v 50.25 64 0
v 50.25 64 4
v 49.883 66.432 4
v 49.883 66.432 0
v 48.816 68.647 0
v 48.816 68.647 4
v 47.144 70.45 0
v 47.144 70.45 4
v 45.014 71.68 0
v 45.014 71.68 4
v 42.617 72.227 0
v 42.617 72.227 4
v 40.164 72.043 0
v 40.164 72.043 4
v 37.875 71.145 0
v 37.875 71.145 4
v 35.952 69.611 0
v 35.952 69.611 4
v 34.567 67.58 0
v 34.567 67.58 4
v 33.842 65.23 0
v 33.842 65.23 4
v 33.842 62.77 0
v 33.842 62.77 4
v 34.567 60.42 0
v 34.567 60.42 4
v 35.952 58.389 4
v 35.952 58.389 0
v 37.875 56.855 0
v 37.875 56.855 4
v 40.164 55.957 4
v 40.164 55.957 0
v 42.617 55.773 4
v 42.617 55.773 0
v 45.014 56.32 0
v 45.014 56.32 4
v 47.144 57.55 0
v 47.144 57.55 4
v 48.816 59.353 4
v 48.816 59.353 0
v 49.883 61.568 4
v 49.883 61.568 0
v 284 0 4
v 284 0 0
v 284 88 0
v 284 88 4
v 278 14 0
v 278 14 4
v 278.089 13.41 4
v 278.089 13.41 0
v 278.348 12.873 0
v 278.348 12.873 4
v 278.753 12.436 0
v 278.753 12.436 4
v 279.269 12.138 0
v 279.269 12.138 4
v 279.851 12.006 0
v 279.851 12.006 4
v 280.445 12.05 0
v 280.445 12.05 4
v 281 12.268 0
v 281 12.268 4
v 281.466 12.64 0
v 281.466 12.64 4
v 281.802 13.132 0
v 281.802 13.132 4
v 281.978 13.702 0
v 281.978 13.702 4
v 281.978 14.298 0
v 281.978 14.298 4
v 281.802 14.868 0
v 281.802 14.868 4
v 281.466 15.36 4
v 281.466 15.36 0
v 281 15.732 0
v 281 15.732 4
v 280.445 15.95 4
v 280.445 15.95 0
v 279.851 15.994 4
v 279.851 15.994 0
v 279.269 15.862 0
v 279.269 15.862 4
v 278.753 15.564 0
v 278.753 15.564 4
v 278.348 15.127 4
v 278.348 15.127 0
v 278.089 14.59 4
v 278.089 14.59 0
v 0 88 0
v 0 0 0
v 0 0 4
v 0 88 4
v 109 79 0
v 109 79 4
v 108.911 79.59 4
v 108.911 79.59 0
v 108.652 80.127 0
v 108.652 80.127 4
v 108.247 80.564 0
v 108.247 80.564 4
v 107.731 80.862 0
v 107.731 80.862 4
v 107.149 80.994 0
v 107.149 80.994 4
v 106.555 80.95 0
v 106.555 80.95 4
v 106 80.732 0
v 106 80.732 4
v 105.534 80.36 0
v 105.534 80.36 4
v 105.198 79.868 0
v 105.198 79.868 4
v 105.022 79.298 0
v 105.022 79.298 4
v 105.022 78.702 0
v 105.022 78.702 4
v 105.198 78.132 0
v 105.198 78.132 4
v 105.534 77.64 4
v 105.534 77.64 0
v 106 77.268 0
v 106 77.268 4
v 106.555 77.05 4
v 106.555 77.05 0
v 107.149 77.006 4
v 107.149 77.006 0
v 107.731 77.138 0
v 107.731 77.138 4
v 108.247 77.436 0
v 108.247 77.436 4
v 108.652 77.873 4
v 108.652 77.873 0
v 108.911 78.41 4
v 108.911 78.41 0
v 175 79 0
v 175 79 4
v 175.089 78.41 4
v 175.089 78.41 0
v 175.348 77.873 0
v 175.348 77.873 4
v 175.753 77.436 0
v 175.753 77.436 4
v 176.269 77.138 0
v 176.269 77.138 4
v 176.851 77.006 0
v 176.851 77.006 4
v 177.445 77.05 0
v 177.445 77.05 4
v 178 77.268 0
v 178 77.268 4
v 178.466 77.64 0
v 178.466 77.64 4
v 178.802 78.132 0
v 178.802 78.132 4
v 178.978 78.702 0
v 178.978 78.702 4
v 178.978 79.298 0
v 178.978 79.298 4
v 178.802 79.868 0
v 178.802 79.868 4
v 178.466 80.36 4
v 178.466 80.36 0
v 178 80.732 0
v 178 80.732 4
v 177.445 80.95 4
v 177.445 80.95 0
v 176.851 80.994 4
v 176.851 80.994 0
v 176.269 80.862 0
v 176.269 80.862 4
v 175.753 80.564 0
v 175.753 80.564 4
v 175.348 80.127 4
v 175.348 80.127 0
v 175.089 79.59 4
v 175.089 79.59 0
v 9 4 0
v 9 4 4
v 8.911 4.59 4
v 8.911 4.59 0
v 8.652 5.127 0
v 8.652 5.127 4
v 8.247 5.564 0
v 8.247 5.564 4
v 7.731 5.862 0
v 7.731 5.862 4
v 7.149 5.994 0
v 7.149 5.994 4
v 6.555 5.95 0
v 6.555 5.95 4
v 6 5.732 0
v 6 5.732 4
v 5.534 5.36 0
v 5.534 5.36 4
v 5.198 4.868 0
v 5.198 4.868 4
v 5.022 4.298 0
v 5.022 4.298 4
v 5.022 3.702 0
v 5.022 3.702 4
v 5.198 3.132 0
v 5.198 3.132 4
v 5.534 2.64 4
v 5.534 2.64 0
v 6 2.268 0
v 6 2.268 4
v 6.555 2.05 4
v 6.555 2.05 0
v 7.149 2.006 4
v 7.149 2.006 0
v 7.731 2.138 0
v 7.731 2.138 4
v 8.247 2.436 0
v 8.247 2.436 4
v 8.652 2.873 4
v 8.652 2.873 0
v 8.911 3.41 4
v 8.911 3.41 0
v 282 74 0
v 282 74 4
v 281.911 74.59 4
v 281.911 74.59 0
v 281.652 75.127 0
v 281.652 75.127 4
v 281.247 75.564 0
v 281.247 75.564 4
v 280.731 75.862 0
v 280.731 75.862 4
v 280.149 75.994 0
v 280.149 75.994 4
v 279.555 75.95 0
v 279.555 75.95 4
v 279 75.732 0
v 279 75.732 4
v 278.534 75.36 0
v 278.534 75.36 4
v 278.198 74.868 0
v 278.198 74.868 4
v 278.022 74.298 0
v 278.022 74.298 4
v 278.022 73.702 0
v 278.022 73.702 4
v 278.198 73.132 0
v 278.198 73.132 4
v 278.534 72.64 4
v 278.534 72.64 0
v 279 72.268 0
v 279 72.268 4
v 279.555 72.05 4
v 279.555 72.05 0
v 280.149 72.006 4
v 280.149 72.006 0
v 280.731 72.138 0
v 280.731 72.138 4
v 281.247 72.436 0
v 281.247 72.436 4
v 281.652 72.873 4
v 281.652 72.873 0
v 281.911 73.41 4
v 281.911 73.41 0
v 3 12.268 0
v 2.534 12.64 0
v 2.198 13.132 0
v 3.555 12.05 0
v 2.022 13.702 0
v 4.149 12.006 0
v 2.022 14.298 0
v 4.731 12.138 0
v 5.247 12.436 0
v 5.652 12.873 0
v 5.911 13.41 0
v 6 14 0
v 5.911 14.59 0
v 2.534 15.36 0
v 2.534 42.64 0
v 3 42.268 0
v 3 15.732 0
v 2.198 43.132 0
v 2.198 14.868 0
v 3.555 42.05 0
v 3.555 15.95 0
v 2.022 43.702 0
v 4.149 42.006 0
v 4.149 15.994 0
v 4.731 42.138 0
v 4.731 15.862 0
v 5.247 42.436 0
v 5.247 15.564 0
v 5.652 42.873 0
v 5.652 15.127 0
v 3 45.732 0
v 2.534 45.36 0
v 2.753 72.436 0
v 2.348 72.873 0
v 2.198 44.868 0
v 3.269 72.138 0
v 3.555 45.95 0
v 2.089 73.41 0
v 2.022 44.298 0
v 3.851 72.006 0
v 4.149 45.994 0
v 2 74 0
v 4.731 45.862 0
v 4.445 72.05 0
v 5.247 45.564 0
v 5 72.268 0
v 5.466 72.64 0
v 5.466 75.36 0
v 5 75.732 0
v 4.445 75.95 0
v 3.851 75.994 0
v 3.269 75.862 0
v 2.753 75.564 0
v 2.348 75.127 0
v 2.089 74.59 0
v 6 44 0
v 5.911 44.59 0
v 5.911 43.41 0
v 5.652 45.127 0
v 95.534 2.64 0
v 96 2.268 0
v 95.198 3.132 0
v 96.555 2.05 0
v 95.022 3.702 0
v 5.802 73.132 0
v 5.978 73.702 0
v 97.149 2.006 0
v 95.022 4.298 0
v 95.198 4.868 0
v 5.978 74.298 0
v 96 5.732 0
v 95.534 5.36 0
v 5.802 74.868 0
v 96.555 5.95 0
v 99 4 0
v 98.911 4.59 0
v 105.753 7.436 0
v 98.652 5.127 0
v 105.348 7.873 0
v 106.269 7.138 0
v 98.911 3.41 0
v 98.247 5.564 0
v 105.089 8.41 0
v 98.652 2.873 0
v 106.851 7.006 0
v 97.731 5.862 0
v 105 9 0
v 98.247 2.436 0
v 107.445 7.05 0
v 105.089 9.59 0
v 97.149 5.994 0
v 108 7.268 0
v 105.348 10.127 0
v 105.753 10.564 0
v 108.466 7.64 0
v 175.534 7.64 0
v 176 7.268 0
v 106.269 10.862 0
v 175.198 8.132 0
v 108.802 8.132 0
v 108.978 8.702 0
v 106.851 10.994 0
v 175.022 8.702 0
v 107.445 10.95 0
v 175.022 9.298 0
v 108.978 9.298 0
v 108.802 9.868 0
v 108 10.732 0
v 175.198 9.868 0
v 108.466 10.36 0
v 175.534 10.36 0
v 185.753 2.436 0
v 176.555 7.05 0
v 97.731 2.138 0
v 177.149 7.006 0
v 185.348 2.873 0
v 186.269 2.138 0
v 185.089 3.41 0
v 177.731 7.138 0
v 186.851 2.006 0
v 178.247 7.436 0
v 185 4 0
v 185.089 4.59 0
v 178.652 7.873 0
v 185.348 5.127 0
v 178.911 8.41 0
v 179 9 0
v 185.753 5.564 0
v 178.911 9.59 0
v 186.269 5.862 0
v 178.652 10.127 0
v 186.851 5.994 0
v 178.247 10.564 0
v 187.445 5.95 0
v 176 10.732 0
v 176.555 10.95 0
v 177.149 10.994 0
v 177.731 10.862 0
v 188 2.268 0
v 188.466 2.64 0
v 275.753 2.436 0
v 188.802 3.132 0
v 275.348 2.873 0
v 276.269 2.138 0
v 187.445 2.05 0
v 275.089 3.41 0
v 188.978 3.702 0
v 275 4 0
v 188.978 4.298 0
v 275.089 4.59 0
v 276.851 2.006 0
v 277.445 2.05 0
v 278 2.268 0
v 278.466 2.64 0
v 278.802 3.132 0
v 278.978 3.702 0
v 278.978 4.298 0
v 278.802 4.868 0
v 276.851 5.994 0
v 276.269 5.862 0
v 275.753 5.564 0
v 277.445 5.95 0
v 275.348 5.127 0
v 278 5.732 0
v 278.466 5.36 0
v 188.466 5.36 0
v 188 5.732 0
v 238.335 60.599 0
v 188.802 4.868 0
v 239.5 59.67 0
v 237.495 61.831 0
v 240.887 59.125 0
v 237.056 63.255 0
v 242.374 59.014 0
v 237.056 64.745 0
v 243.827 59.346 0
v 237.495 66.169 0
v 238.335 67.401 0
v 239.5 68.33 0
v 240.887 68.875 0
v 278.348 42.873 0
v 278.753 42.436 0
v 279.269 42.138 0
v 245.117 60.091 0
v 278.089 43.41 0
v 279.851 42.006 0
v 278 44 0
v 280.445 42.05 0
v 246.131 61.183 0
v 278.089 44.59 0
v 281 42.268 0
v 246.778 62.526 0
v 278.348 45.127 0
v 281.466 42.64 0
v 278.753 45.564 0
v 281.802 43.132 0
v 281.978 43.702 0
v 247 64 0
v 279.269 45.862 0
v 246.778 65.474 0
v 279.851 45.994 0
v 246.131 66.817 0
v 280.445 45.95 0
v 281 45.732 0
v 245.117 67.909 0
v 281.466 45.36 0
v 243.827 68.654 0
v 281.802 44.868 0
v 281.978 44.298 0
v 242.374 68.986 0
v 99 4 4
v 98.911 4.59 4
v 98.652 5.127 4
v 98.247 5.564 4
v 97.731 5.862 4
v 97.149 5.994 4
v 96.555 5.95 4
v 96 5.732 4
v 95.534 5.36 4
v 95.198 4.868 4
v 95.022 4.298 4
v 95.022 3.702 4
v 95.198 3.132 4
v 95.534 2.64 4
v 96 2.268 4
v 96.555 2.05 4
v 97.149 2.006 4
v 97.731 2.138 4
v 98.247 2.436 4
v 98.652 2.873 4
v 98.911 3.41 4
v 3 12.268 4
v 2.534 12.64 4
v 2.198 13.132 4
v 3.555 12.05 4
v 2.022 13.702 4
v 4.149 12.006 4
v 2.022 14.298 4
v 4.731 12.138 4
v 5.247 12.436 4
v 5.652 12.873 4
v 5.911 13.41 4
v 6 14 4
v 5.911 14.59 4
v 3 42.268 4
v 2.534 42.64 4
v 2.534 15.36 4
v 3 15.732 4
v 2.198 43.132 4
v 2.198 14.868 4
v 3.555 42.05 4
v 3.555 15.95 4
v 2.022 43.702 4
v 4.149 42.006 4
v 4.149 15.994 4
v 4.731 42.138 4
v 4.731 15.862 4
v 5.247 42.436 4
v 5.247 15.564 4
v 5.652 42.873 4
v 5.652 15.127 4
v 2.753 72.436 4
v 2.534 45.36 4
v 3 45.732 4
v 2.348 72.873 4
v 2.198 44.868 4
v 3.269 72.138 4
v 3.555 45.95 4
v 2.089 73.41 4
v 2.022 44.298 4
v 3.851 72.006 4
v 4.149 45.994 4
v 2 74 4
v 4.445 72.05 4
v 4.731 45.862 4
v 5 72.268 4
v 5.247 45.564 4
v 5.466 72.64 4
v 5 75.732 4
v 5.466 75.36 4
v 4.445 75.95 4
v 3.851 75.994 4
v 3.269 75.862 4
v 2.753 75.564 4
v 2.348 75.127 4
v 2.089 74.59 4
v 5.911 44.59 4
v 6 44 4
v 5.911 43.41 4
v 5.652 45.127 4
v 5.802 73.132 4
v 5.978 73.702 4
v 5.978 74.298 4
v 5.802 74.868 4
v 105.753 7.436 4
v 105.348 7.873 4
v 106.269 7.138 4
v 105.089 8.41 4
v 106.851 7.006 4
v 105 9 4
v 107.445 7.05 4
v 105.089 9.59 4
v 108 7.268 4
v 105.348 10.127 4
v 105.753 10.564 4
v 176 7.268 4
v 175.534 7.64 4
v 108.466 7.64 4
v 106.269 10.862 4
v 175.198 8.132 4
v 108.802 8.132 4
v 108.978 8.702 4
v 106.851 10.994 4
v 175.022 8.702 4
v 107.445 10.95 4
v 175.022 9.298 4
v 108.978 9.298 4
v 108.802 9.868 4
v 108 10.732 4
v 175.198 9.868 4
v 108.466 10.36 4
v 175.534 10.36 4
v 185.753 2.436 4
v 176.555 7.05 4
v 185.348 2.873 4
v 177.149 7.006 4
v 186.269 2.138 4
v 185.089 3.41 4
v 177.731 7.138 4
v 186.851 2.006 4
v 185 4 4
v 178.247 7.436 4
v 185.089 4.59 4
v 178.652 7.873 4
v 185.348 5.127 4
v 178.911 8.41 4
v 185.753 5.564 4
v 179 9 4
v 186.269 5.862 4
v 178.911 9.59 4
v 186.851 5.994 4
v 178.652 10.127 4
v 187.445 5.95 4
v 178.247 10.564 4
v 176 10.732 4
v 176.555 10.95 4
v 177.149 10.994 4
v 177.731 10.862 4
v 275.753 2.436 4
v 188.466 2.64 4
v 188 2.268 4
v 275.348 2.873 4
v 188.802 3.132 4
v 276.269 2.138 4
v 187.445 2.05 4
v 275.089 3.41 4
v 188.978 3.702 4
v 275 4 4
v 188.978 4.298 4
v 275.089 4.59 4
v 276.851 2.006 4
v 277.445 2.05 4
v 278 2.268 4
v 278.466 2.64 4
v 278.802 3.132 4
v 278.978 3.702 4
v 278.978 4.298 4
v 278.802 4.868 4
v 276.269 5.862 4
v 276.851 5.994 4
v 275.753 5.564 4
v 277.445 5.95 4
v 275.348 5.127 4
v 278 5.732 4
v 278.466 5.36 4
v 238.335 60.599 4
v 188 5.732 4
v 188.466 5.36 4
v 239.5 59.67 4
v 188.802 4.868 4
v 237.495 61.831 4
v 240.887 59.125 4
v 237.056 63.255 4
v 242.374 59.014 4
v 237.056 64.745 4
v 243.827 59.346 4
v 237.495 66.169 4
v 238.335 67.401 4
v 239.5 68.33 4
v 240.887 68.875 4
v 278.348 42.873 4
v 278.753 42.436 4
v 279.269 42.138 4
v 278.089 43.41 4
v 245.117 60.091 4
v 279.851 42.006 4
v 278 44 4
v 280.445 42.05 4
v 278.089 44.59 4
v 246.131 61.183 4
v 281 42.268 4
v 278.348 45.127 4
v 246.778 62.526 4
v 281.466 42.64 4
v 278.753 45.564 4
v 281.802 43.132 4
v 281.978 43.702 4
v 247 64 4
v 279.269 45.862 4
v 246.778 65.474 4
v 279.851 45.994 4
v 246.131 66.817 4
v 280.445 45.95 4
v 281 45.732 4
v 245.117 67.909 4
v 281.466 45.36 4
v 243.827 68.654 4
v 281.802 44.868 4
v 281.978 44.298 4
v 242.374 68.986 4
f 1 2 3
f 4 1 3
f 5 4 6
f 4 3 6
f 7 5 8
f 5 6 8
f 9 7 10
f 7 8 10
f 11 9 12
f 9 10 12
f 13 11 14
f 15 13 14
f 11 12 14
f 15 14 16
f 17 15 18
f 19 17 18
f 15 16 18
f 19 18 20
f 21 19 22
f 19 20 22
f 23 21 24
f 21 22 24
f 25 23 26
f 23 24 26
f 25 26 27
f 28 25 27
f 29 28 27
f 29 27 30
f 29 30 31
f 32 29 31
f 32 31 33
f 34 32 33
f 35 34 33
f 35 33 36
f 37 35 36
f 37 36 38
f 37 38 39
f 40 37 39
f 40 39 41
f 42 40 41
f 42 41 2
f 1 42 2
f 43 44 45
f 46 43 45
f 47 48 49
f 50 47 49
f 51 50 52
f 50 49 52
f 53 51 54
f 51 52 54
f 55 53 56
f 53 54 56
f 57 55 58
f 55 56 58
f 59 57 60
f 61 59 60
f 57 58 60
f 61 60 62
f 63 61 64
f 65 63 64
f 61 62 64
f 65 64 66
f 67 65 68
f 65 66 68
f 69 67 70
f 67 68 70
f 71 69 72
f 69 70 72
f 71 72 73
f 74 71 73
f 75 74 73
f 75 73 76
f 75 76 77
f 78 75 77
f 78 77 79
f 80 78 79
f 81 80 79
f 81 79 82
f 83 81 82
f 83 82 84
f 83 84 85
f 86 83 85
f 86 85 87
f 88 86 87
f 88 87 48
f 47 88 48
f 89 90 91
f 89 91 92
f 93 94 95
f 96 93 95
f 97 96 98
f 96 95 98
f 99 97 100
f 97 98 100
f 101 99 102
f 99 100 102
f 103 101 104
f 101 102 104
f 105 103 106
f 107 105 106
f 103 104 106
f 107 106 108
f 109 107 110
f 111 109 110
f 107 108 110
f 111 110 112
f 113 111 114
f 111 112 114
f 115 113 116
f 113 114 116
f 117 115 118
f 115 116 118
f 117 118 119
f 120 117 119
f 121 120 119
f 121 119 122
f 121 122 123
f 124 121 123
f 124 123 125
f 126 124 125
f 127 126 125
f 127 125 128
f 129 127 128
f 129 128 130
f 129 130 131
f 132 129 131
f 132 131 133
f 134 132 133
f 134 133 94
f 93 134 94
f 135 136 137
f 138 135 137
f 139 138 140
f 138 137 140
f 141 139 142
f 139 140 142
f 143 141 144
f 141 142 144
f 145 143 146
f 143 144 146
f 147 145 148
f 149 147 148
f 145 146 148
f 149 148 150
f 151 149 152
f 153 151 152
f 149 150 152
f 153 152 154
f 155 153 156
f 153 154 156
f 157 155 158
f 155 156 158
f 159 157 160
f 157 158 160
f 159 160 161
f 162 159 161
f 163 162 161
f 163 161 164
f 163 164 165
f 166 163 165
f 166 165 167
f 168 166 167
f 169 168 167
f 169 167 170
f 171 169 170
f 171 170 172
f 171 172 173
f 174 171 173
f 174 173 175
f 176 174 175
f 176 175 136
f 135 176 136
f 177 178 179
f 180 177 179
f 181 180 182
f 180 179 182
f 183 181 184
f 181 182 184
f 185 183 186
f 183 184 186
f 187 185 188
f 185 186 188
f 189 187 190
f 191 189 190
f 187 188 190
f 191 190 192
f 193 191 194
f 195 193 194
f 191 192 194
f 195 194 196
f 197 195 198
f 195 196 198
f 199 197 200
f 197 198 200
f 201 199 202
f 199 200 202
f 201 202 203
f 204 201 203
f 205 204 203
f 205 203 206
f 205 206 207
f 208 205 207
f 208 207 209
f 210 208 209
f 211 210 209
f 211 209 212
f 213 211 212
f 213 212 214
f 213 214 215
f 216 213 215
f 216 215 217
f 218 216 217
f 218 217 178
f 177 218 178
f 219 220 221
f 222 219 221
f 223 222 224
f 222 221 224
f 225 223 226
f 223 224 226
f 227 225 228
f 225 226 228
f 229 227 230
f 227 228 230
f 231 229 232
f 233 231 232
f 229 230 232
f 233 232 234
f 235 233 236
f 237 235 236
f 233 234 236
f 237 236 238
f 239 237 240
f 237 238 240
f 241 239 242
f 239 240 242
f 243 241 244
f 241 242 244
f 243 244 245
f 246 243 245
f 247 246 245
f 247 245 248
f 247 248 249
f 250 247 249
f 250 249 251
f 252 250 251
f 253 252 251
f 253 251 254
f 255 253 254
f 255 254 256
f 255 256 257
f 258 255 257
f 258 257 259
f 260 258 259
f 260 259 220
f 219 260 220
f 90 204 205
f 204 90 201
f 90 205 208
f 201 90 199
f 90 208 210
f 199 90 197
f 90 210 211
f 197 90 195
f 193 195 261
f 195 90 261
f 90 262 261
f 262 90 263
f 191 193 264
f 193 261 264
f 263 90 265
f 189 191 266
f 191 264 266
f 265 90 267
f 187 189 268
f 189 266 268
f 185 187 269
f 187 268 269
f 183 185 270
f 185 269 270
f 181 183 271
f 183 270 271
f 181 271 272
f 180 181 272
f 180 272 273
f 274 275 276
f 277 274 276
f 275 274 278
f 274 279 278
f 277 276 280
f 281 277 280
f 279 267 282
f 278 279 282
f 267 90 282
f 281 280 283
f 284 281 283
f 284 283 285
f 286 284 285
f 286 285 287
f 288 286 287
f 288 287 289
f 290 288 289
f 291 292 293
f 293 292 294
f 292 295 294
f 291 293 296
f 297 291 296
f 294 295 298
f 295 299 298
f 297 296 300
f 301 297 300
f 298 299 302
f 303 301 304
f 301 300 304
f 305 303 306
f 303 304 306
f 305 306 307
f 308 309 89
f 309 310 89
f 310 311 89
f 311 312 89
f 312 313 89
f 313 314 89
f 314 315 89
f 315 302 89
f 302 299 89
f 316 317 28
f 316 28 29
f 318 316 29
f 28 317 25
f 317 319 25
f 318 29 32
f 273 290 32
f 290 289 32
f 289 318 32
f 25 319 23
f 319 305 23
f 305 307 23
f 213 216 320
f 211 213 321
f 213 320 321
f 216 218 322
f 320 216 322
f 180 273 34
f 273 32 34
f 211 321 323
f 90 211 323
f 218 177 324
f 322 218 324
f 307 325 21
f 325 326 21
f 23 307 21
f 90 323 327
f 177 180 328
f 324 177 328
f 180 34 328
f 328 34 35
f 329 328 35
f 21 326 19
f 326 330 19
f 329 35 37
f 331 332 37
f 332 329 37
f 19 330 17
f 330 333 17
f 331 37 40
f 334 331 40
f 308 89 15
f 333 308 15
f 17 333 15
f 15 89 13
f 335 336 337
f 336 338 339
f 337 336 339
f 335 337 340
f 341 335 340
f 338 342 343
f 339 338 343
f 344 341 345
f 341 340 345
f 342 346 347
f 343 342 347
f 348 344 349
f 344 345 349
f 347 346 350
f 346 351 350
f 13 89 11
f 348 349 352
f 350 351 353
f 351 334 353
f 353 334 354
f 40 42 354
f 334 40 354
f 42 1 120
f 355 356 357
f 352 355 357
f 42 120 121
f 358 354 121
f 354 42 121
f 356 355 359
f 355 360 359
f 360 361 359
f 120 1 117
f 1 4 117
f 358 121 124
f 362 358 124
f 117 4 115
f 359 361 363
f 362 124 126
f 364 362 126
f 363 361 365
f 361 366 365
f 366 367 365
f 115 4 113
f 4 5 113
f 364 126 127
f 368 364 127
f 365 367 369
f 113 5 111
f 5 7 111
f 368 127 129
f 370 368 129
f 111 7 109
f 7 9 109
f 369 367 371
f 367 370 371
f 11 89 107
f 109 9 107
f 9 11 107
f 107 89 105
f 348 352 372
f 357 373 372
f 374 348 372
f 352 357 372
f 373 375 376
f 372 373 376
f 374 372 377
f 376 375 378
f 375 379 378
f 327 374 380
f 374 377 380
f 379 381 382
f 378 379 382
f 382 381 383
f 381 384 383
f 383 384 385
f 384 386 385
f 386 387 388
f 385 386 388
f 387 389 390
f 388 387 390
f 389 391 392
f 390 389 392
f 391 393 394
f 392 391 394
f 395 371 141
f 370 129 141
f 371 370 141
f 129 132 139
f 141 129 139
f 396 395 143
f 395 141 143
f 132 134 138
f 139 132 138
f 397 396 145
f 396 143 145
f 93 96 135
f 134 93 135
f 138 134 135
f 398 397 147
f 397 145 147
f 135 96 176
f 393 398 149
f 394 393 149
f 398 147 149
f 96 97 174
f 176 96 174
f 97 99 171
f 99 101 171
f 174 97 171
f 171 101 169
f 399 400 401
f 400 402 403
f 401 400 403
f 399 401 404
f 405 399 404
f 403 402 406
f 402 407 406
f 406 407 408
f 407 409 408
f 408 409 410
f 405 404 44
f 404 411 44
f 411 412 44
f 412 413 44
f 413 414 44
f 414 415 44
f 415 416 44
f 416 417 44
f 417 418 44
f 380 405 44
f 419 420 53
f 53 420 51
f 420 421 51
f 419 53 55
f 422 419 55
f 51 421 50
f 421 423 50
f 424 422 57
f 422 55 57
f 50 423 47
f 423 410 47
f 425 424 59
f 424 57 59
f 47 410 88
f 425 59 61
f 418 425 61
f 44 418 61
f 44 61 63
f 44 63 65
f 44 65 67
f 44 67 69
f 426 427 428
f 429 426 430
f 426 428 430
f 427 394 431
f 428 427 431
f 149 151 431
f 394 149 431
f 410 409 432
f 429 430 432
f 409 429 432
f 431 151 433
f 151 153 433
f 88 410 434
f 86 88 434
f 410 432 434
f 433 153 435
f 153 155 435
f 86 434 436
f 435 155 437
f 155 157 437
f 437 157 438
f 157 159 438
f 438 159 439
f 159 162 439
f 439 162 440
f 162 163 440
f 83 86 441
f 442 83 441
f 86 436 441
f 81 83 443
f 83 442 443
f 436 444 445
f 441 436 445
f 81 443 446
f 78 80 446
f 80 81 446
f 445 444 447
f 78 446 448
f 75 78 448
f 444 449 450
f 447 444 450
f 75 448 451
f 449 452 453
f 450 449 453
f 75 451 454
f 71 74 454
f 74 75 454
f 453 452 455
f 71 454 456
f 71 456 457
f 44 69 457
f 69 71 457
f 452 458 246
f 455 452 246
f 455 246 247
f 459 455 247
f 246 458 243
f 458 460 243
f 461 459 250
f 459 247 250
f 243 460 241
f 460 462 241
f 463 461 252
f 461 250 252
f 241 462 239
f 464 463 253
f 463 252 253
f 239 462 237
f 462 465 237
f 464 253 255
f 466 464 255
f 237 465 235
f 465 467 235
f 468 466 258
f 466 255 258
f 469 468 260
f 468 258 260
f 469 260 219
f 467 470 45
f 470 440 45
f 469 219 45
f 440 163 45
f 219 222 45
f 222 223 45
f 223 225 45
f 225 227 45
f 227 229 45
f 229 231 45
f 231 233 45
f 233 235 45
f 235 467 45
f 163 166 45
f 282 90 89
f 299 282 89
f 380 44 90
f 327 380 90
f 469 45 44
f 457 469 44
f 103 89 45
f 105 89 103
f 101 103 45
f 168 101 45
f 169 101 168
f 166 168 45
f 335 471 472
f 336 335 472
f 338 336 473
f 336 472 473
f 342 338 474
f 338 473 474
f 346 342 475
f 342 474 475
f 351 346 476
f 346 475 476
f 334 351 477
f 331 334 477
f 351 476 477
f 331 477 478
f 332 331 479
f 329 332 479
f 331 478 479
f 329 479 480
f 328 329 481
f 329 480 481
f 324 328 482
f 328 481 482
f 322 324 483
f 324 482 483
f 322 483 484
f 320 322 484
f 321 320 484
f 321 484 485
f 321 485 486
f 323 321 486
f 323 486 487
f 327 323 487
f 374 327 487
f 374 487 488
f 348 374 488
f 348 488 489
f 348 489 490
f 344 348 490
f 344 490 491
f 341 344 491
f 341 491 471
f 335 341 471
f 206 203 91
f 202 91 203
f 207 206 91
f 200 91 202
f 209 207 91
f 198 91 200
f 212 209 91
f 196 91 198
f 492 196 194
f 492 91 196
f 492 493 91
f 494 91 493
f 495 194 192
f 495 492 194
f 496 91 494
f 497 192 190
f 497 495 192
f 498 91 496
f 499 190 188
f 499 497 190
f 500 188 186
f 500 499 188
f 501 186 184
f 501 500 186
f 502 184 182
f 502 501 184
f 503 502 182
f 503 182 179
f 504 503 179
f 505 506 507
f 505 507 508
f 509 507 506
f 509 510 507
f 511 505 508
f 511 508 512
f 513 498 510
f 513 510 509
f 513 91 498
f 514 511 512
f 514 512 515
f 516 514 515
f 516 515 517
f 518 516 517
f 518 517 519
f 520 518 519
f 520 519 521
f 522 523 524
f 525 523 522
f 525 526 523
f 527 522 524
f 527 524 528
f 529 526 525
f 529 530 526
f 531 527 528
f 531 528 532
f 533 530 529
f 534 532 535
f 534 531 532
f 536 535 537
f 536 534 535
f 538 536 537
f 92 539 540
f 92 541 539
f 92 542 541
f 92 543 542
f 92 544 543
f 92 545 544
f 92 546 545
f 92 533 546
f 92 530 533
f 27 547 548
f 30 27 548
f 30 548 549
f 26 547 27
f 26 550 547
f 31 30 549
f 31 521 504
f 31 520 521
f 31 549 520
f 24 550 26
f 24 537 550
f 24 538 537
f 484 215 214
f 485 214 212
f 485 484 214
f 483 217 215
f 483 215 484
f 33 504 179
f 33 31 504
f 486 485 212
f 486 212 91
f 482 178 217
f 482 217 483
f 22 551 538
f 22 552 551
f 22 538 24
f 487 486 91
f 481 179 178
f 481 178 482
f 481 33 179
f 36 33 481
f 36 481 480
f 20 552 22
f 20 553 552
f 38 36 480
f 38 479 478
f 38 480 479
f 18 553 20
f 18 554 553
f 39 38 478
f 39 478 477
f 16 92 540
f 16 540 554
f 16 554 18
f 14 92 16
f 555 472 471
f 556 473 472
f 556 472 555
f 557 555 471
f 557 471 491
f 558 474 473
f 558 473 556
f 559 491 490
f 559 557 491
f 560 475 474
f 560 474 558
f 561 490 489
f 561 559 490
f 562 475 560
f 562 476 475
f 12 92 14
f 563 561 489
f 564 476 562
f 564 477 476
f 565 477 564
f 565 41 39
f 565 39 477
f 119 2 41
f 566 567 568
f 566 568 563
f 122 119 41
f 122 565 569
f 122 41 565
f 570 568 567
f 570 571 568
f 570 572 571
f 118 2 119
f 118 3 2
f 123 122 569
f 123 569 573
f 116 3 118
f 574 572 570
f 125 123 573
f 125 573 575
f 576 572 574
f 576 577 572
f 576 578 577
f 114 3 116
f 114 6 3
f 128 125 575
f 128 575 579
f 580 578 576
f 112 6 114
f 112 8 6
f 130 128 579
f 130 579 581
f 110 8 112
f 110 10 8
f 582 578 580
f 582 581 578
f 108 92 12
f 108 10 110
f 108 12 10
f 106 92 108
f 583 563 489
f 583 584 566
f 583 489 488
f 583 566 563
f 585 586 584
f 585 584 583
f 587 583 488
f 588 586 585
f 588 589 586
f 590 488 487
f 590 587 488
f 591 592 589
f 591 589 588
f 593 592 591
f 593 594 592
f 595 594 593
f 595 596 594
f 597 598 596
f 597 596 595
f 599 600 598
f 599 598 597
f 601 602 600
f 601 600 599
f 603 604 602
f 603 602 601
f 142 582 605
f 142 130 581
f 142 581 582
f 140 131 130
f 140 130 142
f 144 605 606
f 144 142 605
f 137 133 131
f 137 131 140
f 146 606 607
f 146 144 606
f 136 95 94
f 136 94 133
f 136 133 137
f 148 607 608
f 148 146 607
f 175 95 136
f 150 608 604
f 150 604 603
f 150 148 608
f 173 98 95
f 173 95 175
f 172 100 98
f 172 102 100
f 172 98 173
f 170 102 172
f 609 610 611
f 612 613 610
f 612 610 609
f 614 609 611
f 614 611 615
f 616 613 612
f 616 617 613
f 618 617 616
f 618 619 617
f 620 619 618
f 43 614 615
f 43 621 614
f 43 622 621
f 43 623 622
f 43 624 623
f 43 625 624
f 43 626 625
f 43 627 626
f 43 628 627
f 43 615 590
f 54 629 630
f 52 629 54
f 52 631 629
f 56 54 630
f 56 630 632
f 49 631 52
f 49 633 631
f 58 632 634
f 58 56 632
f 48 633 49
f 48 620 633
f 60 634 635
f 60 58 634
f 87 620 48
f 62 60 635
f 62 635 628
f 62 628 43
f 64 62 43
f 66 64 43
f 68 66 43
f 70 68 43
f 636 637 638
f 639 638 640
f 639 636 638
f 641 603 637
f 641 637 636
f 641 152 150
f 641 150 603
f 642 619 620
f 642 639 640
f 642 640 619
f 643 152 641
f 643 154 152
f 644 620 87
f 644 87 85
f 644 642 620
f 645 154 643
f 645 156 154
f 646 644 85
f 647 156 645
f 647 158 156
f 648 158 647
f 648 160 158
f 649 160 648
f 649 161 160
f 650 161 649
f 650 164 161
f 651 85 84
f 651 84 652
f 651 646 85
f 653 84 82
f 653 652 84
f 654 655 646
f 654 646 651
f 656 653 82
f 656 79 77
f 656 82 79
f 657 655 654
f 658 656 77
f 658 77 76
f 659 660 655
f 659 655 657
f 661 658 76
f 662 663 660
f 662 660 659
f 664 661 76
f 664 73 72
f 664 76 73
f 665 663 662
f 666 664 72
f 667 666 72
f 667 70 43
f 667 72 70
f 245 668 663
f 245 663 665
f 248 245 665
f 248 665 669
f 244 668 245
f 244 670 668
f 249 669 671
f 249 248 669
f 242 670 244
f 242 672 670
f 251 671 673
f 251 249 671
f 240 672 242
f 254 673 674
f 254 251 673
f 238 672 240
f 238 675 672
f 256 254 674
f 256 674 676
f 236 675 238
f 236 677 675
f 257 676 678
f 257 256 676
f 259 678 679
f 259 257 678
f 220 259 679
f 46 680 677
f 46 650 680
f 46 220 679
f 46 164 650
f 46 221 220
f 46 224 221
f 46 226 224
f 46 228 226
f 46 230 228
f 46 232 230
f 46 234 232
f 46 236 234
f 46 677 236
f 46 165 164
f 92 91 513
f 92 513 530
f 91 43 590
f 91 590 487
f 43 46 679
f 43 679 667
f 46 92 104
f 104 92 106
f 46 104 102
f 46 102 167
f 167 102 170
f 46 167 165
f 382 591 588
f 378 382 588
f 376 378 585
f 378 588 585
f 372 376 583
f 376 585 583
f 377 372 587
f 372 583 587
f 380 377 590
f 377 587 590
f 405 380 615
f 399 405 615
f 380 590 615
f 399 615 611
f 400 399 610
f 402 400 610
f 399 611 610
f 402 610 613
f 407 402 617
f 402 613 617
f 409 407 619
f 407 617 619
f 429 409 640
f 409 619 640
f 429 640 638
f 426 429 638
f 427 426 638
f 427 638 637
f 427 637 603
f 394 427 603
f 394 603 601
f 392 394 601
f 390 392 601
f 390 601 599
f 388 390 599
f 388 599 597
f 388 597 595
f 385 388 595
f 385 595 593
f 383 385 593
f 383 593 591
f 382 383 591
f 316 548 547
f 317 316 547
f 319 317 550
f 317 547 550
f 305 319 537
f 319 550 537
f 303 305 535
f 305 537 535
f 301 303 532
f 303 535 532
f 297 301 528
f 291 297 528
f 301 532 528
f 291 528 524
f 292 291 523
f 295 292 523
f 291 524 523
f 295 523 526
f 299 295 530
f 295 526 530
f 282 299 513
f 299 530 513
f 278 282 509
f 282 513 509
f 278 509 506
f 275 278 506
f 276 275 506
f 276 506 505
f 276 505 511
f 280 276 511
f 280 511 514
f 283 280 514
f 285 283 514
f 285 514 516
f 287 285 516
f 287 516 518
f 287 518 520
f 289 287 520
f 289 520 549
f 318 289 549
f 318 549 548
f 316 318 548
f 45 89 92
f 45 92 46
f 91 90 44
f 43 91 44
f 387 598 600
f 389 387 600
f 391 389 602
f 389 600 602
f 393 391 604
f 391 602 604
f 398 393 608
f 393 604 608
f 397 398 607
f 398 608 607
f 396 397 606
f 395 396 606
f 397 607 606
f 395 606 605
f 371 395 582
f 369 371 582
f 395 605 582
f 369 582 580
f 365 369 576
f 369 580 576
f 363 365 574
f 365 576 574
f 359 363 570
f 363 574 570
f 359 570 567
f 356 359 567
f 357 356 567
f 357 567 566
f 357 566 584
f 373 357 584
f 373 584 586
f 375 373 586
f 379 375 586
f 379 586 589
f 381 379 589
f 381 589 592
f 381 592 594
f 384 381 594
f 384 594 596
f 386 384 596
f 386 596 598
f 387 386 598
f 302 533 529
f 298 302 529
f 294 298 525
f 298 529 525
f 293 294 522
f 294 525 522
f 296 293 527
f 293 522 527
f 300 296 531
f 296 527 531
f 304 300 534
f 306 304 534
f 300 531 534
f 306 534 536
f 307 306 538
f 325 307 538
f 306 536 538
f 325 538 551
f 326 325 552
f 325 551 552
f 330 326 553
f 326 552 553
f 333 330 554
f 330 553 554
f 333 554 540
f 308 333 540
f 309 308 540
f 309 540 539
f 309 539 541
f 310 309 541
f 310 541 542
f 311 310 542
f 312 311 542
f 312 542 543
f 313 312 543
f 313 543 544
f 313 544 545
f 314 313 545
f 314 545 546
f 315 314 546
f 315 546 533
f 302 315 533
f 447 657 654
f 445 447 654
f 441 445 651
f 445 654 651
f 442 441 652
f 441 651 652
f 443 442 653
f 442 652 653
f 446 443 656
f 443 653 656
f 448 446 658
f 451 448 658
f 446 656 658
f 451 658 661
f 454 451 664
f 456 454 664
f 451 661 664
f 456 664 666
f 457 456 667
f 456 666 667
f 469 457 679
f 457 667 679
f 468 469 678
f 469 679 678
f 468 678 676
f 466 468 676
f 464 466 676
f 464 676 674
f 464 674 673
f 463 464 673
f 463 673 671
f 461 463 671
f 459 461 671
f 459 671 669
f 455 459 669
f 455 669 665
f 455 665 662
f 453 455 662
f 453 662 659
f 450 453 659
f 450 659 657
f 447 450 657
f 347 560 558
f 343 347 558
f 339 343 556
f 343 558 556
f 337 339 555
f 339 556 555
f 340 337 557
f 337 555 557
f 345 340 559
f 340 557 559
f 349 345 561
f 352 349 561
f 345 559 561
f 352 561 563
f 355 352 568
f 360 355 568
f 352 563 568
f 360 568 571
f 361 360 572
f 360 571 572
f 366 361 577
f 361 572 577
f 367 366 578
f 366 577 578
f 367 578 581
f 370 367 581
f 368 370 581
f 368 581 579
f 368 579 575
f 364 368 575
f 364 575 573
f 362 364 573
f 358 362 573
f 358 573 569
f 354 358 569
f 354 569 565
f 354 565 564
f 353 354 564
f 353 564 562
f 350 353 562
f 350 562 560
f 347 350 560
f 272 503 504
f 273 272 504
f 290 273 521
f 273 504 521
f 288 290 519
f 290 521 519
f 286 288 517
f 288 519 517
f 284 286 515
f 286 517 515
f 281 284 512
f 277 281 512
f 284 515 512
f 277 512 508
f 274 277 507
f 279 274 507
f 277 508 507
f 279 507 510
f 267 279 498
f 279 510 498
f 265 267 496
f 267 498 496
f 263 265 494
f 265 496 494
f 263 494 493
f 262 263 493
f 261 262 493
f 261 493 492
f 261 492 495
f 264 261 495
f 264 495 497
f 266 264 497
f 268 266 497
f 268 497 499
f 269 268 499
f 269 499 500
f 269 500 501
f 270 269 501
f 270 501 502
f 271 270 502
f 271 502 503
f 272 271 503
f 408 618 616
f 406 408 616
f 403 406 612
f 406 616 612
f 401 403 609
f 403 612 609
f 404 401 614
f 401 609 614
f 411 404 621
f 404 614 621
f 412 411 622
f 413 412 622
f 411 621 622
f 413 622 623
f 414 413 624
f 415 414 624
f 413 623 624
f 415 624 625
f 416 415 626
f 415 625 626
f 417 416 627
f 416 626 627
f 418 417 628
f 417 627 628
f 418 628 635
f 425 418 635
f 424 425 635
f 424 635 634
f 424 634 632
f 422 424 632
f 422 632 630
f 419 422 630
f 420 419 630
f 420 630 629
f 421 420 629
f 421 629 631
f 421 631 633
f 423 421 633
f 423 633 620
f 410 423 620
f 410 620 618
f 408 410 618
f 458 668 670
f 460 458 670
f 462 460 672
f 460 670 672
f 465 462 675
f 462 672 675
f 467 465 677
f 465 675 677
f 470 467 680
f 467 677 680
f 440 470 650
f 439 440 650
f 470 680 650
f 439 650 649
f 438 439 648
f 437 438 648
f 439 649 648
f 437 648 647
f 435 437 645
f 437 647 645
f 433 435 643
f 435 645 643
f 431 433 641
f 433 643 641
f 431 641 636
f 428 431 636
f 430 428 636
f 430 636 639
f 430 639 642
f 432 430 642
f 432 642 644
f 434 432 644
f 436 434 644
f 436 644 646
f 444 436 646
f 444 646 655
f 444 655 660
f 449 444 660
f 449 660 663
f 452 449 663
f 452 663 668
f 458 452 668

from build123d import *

# Parameters (mm, degrees)
ESQUISSE1_W             = 284
ESQUISSE1_H             = 88
BOSS_EXTRU_1_DEPTH      = 4
ESQUISSE2_R             = 2
ESQUISSE2_R_2           = 8.25
ESQUISSE2_R_3           = 5
ENL_V_MAT_EXTRU_1_DEPTH = 298.348280641


with BuildPart() as part:
    # Esquisse1 → Boss.-Extru.1 (new body)
    with BuildSketch(Plane.XY):
        with Locations((142, 44)):
            Rectangle(ESQUISSE1_W, ESQUISSE1_H)
    extrude(amount=BOSS_EXTRU_1_DEPTH)

    # Esquisse2 → Enlèv. mat.-Extru.1 (cut, through all)
    with BuildSketch(Plane.XY.offset(4)):
        with Locations((107, 79)):
            Circle(ESQUISSE2_R)
        with Locations(Location((107, 9, 0), (0, 0, 180))):
            Circle(ESQUISSE2_R)
        with Locations((177, 9)):
            Circle(ESQUISSE2_R)
        with Locations(Location((177, 79, 0), (0, 0, 180))):
            Circle(ESQUISSE2_R)
        with Locations((42, 64)):
            Circle(ESQUISSE2_R_2)
        with Locations((4, 14)):
            Circle(ESQUISSE2_R)
        with Locations(Location((4, 74, 0), (0, 0, 180))):
            Circle(ESQUISSE2_R)
        with Locations((4, 44)):
            Circle(ESQUISSE2_R)
        with Locations(Location((280, 44, 0), (0, 0, 180))):
            Circle(ESQUISSE2_R)
        with Locations((280, 74)):
            Circle(ESQUISSE2_R)
        with Locations(Location((280, 14, 0), (0, 0, 180))):
            Circle(ESQUISSE2_R)
        with Locations((7, 4)):
            Circle(ESQUISSE2_R)
        with Locations((97, 4)):
            Circle(ESQUISSE2_R)
        with Locations(Location((187, 4, 0), (0, 0, 180))):
            Circle(ESQUISSE2_R)
        with Locations(Location((277, 4, 0), (0, 0, 180))):
            Circle(ESQUISSE2_R)
        with Locations((242, 64)):
            Circle(ESQUISSE2_R_3)
    extrude(amount=-ENL_V_MAT_EXTRU_1_DEPTH, mode=Mode.SUBTRACT)


solid = part.part
